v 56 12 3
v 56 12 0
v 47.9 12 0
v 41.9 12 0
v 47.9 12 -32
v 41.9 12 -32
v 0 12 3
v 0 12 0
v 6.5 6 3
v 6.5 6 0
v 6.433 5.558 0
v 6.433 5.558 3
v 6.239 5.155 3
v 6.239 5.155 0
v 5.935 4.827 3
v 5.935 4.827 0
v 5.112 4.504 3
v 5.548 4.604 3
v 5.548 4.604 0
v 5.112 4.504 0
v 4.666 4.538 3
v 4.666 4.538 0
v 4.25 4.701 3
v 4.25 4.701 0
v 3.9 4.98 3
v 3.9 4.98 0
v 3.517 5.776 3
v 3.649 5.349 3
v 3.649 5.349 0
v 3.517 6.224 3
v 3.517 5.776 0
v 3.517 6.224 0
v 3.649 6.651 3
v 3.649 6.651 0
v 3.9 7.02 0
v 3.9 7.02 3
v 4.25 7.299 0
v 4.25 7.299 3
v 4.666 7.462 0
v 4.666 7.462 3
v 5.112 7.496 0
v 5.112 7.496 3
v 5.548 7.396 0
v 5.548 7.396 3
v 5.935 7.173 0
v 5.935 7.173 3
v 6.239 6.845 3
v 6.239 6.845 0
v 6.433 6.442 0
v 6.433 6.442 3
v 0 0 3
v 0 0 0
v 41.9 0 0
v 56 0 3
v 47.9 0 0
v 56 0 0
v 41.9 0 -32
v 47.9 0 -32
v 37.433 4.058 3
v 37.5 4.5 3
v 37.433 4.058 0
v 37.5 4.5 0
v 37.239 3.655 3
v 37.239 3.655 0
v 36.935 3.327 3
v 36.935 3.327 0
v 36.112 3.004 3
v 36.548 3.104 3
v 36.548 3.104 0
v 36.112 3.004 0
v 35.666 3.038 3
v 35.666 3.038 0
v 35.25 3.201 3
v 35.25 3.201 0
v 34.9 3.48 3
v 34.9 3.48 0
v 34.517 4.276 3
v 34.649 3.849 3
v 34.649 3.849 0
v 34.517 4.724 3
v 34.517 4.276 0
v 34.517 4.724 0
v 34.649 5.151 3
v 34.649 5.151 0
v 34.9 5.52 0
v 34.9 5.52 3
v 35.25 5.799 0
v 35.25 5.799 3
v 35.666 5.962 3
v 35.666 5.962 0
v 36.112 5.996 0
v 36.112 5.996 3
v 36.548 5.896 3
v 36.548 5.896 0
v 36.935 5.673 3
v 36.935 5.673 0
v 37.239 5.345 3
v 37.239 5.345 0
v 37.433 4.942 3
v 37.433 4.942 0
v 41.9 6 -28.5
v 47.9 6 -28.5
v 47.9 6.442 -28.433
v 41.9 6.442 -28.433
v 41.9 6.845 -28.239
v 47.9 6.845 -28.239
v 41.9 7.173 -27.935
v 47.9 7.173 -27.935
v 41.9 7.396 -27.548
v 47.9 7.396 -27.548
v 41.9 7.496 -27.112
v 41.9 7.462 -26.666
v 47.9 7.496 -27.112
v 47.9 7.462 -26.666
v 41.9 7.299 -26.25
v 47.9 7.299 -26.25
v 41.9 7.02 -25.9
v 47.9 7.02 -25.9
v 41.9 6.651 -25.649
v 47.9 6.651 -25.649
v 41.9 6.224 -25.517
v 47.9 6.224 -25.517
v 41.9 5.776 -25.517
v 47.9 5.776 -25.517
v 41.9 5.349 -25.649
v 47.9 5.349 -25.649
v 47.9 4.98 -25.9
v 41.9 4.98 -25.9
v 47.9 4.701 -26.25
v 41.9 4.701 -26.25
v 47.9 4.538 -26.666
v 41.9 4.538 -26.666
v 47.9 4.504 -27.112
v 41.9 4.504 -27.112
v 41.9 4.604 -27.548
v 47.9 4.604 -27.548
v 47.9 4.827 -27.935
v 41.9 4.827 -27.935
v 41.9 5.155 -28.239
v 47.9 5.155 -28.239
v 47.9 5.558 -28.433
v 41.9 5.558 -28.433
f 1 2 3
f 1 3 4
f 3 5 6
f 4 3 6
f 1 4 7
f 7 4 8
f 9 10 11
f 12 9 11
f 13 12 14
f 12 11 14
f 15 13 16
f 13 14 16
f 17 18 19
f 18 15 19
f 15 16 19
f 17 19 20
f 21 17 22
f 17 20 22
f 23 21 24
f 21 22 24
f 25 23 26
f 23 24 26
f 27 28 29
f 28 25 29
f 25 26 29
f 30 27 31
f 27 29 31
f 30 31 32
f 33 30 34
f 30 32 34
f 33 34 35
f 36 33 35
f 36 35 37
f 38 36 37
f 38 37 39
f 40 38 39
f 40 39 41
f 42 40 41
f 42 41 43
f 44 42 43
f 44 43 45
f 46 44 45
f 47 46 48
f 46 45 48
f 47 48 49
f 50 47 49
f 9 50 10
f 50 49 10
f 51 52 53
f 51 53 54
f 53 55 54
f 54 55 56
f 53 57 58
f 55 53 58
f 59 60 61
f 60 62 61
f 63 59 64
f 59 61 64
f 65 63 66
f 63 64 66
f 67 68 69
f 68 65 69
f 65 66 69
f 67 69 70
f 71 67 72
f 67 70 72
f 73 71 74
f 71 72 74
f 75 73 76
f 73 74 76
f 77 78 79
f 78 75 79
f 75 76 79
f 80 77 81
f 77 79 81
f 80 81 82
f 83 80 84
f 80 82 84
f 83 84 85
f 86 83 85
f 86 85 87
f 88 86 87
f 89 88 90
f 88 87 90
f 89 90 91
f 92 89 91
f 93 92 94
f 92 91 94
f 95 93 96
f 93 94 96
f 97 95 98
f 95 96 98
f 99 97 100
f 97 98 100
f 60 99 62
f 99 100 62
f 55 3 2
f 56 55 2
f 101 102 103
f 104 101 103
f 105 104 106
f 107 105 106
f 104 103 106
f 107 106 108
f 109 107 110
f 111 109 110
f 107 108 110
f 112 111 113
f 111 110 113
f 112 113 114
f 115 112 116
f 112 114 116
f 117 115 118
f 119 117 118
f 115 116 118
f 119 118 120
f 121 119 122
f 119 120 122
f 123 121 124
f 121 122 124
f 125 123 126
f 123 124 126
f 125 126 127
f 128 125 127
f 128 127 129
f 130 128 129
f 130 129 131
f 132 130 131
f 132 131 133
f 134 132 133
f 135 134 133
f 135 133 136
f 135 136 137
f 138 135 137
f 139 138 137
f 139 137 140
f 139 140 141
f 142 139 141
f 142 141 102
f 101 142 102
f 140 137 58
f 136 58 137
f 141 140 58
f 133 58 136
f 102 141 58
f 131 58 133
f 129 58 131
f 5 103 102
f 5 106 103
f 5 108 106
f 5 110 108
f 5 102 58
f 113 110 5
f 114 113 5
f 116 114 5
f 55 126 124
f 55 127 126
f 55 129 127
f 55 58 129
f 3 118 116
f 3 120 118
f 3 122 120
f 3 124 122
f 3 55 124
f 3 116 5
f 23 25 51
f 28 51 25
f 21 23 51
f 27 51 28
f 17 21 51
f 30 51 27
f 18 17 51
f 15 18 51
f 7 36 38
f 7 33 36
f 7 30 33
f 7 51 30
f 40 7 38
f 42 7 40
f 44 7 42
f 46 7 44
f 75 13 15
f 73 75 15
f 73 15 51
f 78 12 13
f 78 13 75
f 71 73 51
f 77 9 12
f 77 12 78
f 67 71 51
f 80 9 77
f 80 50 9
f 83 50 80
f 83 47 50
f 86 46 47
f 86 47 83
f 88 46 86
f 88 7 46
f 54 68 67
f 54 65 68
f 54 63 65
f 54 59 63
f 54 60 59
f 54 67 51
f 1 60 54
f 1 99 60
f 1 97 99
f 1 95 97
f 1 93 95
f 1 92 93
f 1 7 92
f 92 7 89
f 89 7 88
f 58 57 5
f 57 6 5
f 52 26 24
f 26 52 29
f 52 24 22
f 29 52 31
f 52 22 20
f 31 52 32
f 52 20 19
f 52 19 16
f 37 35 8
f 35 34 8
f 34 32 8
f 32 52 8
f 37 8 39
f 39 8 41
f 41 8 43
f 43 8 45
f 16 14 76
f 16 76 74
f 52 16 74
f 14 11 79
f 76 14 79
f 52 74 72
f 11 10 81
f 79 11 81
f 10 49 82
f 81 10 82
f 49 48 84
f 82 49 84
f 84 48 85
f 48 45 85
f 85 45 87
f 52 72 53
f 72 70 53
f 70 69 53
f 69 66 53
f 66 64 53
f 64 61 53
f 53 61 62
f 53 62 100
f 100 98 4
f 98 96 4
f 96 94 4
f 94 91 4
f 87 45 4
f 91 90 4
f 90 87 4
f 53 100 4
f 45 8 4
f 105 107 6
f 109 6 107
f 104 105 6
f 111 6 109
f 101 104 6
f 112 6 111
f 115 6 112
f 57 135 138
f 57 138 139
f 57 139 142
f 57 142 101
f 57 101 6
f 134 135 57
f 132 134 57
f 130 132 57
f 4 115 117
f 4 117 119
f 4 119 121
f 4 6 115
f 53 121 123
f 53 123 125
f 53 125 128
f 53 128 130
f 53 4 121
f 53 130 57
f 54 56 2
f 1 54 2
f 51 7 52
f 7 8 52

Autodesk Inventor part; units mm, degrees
ref_plane "YZ Plane" through (0, 0, 0) normal (1, 0, 0) x (0, 1, 0)
ref_plane "XZ Plane" through (0, 0, 0) normal (0, 1, 0) x (-1, 0, 0)
ref_plane "XY Plane" through (0, 0, 0) normal (0, 0, 1) x (1, 0, 0)
sketch "Sketch3" plane through (0, 0, 0) normal (0, 0, 1) x (1, 0, 0)
  line L0 (0, 0) -> (56, 0)
  line L1 (56, 0) -> (56, 12)
  line L2 (56, 12) -> (0, 12)
  line L3 (0, 12) -> (0, 0)
  circle A0 centre (36, 4.5) radius 1.5
  circle A1 centre (5, 6) radius 1.5
  dimension "d0" = 56
  dimension "d2" = 3
  dimension "d3" = 4.5
  dimension "d4" = 12
  dimension "d8" = 20
  dimension "d17" = 3
  dimension "d18" = 5
extrude "Extrusion1" add sketch "Sketch3" along normal blind 3
sketch "Sketch4" plane through (0, 0, 3) normal (0, 0, 1) x (1, 0, 0)
  line L0 (56, 12) -> (0, 12) projected
  line L1 (41.9, 0) -> (47.9, 0)
  line L2 (47.9, 0) -> (47.9, 12)
  line L3 (47.9, 12) -> (41.9, 12)
  line L4 (41.9, 12) -> (41.9, 0)
  circle A0 centre (36, 4.5) radius 1.5 projected
  point P0 (0, 0)
  dimension "d9" = 6
  dimension "d10" = 5.9
extrude "Extrusion2" add sketch "Sketch4" against normal blind 35 contours L2 L1 L4 L0
sketch "Sketch5" plane through (47.9, 0, 0) normal (1, 0, 0) x (0, 0, -1)
  line L0 (32, 0) -> (32, 12) construction
  line L1 (0, 6) -> (0, 3) construction
  line L2 (32, 6) -> (0, 6) construction
  circle A0 centre (27, 6) radius 1.5
  point P0 (0, 0)
  dimension "d13" = 3
  dimension "d14" = 5
extrude "Extrusion3" cut sketch "Sketch5" against normal through all
properties part number "thumper-bumper-solenoid-interface-v2"
